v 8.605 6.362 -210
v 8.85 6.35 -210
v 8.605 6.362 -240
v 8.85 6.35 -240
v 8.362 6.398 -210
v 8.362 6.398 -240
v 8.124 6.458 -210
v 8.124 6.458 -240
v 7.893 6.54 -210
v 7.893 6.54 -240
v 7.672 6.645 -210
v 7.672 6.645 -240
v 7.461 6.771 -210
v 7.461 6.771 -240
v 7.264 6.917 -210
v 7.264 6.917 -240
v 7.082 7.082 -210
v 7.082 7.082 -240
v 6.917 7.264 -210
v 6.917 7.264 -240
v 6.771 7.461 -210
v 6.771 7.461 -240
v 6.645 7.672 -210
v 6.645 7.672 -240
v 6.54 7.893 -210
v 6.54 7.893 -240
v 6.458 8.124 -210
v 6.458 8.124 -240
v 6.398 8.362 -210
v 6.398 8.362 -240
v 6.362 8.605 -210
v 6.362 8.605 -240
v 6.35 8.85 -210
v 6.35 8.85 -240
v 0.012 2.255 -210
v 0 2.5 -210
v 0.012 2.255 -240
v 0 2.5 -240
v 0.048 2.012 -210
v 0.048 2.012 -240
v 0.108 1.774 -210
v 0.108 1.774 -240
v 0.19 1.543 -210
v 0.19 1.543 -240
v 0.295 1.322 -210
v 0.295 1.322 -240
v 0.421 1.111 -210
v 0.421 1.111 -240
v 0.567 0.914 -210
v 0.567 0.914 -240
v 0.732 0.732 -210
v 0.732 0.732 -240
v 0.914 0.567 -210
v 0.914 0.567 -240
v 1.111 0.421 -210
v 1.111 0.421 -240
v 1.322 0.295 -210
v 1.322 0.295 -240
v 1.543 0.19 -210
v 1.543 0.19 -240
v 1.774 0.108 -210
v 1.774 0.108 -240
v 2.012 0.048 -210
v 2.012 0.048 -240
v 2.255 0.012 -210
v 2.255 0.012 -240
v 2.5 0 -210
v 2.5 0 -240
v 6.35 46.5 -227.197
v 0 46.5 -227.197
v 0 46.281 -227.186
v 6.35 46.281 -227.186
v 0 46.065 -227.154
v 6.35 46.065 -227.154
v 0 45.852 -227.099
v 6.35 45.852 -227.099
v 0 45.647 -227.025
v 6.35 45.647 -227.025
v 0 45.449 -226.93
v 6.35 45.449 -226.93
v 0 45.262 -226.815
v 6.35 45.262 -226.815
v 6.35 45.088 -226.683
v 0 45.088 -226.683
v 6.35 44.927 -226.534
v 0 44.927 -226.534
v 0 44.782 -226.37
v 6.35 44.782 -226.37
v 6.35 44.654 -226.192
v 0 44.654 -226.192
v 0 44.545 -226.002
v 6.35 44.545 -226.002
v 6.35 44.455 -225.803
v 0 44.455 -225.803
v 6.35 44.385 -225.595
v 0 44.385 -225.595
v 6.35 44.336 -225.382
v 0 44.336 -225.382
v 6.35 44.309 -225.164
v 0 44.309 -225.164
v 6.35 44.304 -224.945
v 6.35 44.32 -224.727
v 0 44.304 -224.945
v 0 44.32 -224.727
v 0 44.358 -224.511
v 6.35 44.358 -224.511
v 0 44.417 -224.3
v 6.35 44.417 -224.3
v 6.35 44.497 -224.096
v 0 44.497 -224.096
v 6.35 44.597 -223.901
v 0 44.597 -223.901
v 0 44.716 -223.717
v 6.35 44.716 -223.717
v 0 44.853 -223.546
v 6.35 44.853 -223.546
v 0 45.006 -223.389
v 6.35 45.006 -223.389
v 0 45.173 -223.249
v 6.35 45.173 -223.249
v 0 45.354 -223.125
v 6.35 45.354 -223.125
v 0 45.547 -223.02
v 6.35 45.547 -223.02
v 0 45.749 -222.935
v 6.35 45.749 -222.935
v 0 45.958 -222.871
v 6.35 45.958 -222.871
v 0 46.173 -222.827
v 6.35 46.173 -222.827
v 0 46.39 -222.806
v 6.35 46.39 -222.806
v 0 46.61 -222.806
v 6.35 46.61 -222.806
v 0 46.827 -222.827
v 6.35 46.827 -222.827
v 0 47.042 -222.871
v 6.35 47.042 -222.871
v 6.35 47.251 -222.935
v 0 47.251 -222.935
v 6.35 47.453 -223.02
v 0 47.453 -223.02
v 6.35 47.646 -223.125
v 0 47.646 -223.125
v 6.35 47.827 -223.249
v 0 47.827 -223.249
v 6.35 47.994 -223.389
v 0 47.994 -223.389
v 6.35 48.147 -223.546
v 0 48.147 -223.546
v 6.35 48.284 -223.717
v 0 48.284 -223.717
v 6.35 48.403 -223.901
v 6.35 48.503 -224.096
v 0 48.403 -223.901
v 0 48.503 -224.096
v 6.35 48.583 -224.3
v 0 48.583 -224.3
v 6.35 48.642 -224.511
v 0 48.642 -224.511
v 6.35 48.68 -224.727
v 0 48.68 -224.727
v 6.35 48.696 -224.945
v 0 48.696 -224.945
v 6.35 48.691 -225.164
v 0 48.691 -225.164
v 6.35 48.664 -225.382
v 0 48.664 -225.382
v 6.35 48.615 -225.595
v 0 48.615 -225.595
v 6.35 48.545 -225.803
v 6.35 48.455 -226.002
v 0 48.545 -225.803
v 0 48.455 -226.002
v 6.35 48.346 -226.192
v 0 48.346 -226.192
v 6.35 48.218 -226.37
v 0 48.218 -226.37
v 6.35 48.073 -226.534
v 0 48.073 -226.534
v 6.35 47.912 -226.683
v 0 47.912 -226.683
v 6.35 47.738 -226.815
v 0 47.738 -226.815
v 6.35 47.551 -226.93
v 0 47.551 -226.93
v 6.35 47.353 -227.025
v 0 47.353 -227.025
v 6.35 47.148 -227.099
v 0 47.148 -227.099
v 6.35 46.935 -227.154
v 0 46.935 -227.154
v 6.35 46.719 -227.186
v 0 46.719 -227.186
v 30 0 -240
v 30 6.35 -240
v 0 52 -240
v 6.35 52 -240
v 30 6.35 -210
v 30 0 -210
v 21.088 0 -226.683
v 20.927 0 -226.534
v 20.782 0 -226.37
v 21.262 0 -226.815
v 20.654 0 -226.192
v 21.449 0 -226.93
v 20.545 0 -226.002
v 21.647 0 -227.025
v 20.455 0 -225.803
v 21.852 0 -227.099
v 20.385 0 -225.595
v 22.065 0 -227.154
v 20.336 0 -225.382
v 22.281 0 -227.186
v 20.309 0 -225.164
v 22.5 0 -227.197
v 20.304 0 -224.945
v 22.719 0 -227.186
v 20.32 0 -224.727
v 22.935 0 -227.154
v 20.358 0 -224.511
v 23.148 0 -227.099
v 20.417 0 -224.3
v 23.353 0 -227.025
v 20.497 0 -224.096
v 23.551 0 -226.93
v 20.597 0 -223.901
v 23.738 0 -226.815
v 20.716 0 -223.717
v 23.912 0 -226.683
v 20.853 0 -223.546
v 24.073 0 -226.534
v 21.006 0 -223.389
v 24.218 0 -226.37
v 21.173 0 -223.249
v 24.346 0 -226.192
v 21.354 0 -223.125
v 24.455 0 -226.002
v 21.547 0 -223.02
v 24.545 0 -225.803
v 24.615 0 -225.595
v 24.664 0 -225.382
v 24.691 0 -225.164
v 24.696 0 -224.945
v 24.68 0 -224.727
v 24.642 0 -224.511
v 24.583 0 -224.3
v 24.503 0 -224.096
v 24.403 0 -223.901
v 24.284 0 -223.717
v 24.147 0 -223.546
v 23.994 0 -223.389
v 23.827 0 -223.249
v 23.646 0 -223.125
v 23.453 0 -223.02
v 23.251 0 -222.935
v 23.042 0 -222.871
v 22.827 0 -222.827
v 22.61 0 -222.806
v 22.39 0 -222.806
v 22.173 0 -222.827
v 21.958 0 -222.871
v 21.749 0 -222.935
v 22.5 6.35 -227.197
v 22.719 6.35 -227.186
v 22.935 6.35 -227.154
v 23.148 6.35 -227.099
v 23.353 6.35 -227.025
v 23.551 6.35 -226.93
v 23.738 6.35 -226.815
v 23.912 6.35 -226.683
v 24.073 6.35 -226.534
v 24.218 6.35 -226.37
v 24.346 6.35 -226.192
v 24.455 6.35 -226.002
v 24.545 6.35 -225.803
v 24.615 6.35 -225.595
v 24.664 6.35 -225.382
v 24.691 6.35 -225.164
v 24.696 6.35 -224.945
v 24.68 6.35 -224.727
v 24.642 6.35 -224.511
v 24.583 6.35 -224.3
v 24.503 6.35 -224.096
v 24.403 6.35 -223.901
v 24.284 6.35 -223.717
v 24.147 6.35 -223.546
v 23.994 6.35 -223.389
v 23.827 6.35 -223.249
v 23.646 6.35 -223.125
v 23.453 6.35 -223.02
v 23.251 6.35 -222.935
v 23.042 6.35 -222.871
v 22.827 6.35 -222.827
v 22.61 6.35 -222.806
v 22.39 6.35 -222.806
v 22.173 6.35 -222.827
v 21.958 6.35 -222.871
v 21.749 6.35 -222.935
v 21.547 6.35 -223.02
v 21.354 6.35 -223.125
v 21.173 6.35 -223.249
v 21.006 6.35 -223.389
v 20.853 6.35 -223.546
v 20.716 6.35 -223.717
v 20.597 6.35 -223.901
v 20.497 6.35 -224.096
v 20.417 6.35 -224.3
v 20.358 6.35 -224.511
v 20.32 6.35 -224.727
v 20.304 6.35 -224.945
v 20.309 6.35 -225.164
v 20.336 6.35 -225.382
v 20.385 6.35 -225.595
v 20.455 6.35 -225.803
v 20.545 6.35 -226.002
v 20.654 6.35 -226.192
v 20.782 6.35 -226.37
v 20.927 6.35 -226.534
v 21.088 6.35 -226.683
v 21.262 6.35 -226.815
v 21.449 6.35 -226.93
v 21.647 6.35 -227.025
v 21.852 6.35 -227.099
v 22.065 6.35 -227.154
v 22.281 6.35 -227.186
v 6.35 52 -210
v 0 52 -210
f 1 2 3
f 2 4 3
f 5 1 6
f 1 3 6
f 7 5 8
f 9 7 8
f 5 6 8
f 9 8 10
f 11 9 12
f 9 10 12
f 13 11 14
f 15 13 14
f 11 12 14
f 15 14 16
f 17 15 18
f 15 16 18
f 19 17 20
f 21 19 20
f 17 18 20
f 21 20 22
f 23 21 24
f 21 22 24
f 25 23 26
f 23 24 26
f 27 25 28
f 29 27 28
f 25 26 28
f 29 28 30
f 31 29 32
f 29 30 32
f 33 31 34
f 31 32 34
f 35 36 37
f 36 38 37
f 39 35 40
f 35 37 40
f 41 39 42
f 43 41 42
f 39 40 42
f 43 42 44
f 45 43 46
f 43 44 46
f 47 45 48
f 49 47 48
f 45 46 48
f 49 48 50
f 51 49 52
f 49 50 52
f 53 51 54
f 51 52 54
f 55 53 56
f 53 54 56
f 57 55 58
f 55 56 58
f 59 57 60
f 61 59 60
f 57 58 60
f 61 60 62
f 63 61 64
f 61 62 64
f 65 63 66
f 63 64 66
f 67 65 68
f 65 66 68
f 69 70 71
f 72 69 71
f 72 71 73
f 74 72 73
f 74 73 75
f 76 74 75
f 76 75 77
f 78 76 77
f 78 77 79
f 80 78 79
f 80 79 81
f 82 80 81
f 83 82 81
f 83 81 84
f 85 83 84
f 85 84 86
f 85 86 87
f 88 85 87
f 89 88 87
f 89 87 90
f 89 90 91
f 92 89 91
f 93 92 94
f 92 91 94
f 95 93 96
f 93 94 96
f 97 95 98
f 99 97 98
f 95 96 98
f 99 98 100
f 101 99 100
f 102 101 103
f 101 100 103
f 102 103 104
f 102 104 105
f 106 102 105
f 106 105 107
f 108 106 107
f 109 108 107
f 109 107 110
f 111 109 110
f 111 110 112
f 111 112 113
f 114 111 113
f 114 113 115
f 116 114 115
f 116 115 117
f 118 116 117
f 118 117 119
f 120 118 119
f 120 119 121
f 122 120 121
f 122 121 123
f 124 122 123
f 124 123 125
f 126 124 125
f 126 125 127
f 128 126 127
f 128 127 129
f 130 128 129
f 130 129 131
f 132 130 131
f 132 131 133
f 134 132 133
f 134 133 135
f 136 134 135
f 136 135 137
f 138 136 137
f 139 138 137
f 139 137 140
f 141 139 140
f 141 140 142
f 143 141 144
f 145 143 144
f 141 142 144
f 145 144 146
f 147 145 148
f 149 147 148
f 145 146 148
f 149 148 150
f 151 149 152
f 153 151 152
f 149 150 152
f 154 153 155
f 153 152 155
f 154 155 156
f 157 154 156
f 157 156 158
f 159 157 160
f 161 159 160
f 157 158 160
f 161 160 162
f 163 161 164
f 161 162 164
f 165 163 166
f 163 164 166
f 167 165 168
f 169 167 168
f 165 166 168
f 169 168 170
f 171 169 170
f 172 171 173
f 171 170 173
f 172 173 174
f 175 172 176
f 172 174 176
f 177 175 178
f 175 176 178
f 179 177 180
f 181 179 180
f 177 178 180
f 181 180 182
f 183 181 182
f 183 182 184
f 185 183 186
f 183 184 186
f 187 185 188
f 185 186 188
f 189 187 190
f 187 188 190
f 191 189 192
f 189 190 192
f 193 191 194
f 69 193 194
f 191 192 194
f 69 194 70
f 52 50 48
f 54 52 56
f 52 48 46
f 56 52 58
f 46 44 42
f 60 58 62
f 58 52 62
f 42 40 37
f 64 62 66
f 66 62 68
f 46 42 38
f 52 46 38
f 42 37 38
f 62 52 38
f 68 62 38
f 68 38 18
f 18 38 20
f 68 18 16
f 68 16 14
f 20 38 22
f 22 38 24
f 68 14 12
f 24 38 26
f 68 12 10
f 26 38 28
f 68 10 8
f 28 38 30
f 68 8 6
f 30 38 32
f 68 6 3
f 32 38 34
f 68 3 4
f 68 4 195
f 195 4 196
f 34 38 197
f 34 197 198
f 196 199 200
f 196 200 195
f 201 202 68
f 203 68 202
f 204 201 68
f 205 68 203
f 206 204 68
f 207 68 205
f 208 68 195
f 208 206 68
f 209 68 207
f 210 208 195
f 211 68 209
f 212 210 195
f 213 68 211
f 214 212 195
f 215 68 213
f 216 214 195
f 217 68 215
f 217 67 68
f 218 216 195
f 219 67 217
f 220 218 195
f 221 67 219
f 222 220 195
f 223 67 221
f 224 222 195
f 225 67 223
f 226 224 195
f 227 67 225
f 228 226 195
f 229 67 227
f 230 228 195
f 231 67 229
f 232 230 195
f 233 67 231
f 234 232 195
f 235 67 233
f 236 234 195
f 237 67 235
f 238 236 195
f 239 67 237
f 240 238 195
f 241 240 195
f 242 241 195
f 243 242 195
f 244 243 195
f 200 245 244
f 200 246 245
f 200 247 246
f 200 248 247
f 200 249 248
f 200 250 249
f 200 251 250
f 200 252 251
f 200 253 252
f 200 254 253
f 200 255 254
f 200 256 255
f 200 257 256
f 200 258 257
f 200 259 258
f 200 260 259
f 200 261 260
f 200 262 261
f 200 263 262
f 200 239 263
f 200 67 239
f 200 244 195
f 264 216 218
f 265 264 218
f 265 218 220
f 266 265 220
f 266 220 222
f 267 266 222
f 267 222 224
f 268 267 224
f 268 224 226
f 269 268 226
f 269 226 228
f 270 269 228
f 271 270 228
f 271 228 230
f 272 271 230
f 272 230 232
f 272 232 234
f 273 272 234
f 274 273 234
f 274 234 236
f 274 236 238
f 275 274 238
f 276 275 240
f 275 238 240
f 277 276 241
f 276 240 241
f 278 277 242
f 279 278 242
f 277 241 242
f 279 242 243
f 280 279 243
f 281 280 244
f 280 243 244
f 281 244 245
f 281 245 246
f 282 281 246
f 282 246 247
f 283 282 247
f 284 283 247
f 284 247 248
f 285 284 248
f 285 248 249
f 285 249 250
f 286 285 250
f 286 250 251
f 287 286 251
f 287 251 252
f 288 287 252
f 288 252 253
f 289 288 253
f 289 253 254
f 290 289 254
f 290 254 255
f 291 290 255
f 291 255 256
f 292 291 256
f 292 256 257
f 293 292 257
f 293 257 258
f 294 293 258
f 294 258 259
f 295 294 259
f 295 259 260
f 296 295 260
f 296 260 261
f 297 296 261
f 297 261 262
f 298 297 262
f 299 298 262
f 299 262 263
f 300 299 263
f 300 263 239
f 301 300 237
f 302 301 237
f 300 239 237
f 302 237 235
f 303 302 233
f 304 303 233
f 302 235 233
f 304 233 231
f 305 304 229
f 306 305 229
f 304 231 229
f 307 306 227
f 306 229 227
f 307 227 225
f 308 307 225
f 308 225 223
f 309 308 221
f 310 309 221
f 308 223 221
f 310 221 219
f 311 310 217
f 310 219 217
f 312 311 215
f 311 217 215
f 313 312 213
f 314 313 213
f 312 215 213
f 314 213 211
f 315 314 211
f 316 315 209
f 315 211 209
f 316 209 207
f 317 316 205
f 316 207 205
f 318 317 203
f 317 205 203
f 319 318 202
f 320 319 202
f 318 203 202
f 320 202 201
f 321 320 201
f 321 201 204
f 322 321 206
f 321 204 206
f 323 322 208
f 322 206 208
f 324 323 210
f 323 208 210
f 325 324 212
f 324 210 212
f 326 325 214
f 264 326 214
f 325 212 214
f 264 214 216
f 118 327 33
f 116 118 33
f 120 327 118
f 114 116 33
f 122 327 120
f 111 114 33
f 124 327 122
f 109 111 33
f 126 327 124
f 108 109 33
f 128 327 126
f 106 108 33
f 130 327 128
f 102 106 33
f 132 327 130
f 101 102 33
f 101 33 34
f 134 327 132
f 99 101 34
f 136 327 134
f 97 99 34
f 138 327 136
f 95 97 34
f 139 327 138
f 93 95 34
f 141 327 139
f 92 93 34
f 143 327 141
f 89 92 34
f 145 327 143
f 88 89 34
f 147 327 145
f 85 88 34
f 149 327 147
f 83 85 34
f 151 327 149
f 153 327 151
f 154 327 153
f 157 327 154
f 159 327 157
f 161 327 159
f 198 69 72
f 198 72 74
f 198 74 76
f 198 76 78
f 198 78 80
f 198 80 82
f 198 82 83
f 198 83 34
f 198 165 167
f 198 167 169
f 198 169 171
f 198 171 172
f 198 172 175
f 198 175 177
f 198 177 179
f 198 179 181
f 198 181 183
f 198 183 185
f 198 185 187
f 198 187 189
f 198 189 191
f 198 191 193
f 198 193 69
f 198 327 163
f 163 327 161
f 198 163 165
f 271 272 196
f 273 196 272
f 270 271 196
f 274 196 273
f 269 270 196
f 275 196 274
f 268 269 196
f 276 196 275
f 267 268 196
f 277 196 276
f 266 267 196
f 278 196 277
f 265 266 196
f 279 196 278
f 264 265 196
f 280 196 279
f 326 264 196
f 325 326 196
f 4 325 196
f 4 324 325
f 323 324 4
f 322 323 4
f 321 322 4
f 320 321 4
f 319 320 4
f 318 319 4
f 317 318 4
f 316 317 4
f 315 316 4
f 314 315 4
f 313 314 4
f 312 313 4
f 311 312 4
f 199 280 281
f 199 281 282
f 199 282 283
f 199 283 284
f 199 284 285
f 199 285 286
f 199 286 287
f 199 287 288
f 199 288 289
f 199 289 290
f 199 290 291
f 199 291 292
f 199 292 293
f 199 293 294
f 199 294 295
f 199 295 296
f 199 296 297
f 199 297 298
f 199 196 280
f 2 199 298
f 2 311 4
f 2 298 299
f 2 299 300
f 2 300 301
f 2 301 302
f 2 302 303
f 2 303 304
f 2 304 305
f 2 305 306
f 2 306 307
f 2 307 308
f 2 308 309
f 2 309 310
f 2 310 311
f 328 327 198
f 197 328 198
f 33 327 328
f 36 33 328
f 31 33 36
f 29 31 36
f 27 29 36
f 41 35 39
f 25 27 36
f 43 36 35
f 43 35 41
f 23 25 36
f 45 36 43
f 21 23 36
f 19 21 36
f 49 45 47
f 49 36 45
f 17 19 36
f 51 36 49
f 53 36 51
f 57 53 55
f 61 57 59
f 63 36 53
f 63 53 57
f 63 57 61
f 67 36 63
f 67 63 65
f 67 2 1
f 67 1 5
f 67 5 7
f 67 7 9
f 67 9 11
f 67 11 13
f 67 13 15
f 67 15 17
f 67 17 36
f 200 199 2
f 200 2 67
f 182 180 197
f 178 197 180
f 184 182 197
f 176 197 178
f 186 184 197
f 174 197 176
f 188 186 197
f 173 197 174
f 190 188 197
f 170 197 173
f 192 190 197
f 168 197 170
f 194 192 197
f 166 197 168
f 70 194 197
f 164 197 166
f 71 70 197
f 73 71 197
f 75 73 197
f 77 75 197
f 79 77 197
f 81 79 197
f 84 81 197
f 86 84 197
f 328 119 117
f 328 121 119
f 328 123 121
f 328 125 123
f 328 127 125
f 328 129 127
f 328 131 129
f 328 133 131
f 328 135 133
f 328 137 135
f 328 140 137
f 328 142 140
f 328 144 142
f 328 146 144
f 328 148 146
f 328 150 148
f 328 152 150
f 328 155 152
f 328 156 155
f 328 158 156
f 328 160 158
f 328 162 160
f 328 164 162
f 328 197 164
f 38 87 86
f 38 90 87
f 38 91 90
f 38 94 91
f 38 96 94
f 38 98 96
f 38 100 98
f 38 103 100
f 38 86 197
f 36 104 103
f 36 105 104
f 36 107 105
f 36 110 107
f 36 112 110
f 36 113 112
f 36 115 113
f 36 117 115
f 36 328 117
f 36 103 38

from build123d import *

# Parameters (mm, degrees)
EXTRUDE_THIN1_DEPTH              = 240
SKETCH3_W                        = 35
SKETCH3_H                        = 300
EXTRUDE2_DEPTH                   = 7.35
SKETCH7_W                        = 300
SKETCH7_H                        = 30
EXTRUDE4_DEPTH                   = 7.35
EXTRUDE5_DEPTH                   = 7.35
TAPPED_HOLE_FOR_8_32_HELICOIL1_D = 4.3942
SKETCH26_W                       = 220
SKETCH26_H                       = 70
EXTRUDE18_DEPTH                  = 24.65
EXTRUDE18_DEPTH_BACK             = 7.35
TAPPED_HOLE_FOR_8_32_HELICOIL2_D = 4.3942
FILLET1_R                        = 2.5


with BuildPart() as part:
    # Sketch1 → Extrude-Thin1 (new body)
    with BuildSketch(Plane.XY):
        Polygon((0, 55), (0, 0), (50.8, 0), (50.8, 6.35), (6.35, 6.35), (6.35, 55), align=None)
    extrude(amount=-EXTRUDE_THIN1_DEPTH)

    # Sketch3 → Extrude2 (cut, through all)
    with BuildSketch(Plane(origin=(0, 6.35, 0), x_dir=(1, 0, 0), z_dir=(0, 1, 0))):
        with Locations((47.5, 95)):
            Rectangle(SKETCH3_W, SKETCH3_H)
    extrude(amount=-EXTRUDE2_DEPTH, mode=Mode.SUBTRACT)

    # Sketch7 → Extrude4 (cut, through all)
    with BuildSketch(Plane(origin=(6.35, 0, 0), x_dir=(0, 0, -1), z_dir=(1, 0, 0))):
        with Locations((145, 67)):
            Rectangle(SKETCH7_W, SKETCH7_H)
    extrude(amount=-EXTRUDE4_DEPTH, mode=Mode.SUBTRACT)

    # Sketch10 → Extrude5 (cut, through all)
    with BuildSketch(Plane(origin=(6.35, 0, 0), x_dir=(0, 0, -1), z_dir=(1, 0, 0))):
        with BuildLine():
            Line((30, 67), (210, 67))
            Line((210, 67), (210, 22))
            ThreePointArc((210, 22), (208.535533906, 18.464466094), (205, 17))
            Line((205, 17), (35, 17))
            ThreePointArc((35, 17), (31.464466094, 18.464466094), (30, 22))
            Line((30, 22), (30, 67))
        make_face()
    extrude(amount=-EXTRUDE5_DEPTH, mode=Mode.SUBTRACT)

    # Tapped Hole for #8-32 Helicoil1 (through all)
    with Locations(Plane(origin=(6.35, 46.5, -15), x_dir=(0, 0, 1), z_dir=(1, 0, 0))):
        with Locations((0, 0), (-210, 0)):
            Hole(TAPPED_HOLE_FOR_8_32_HELICOIL1_D / 2)

    # Sketch26 → Extrude18 (cut, two sides)
    with BuildSketch(Plane(origin=(6.35, 0, 0), x_dir=(0, 0, -1), z_dir=(1, 0, 0))) as extrude18_sk:
        with Locations((100, 27)):
            Rectangle(SKETCH26_W, SKETCH26_H)
    extrude(amount=EXTRUDE18_DEPTH, mode=Mode.SUBTRACT)
    extrude(extrude18_sk.sketch, amount=-EXTRUDE18_DEPTH_BACK, mode=Mode.SUBTRACT)

    # Tapped Hole for #8-32 Helicoil2 (through all)
    with Locations(Plane(origin=(22.5, 6.35, -225), x_dir=(0, 0, 1), z_dir=(0, 1, 0))):
        with Locations((0, 0)):
            Hole(TAPPED_HOLE_FOR_8_32_HELICOIL2_D / 2)

    # Fillet1
    fillet1_edges = [part.edges().sort_by_distance(p)[0] for p in [
        (6.35, 6.35, -225),
        (0, 0, -225),
    ]]
    fillet(fillet1_edges, radius=FILLET1_R)


solid = part.part
